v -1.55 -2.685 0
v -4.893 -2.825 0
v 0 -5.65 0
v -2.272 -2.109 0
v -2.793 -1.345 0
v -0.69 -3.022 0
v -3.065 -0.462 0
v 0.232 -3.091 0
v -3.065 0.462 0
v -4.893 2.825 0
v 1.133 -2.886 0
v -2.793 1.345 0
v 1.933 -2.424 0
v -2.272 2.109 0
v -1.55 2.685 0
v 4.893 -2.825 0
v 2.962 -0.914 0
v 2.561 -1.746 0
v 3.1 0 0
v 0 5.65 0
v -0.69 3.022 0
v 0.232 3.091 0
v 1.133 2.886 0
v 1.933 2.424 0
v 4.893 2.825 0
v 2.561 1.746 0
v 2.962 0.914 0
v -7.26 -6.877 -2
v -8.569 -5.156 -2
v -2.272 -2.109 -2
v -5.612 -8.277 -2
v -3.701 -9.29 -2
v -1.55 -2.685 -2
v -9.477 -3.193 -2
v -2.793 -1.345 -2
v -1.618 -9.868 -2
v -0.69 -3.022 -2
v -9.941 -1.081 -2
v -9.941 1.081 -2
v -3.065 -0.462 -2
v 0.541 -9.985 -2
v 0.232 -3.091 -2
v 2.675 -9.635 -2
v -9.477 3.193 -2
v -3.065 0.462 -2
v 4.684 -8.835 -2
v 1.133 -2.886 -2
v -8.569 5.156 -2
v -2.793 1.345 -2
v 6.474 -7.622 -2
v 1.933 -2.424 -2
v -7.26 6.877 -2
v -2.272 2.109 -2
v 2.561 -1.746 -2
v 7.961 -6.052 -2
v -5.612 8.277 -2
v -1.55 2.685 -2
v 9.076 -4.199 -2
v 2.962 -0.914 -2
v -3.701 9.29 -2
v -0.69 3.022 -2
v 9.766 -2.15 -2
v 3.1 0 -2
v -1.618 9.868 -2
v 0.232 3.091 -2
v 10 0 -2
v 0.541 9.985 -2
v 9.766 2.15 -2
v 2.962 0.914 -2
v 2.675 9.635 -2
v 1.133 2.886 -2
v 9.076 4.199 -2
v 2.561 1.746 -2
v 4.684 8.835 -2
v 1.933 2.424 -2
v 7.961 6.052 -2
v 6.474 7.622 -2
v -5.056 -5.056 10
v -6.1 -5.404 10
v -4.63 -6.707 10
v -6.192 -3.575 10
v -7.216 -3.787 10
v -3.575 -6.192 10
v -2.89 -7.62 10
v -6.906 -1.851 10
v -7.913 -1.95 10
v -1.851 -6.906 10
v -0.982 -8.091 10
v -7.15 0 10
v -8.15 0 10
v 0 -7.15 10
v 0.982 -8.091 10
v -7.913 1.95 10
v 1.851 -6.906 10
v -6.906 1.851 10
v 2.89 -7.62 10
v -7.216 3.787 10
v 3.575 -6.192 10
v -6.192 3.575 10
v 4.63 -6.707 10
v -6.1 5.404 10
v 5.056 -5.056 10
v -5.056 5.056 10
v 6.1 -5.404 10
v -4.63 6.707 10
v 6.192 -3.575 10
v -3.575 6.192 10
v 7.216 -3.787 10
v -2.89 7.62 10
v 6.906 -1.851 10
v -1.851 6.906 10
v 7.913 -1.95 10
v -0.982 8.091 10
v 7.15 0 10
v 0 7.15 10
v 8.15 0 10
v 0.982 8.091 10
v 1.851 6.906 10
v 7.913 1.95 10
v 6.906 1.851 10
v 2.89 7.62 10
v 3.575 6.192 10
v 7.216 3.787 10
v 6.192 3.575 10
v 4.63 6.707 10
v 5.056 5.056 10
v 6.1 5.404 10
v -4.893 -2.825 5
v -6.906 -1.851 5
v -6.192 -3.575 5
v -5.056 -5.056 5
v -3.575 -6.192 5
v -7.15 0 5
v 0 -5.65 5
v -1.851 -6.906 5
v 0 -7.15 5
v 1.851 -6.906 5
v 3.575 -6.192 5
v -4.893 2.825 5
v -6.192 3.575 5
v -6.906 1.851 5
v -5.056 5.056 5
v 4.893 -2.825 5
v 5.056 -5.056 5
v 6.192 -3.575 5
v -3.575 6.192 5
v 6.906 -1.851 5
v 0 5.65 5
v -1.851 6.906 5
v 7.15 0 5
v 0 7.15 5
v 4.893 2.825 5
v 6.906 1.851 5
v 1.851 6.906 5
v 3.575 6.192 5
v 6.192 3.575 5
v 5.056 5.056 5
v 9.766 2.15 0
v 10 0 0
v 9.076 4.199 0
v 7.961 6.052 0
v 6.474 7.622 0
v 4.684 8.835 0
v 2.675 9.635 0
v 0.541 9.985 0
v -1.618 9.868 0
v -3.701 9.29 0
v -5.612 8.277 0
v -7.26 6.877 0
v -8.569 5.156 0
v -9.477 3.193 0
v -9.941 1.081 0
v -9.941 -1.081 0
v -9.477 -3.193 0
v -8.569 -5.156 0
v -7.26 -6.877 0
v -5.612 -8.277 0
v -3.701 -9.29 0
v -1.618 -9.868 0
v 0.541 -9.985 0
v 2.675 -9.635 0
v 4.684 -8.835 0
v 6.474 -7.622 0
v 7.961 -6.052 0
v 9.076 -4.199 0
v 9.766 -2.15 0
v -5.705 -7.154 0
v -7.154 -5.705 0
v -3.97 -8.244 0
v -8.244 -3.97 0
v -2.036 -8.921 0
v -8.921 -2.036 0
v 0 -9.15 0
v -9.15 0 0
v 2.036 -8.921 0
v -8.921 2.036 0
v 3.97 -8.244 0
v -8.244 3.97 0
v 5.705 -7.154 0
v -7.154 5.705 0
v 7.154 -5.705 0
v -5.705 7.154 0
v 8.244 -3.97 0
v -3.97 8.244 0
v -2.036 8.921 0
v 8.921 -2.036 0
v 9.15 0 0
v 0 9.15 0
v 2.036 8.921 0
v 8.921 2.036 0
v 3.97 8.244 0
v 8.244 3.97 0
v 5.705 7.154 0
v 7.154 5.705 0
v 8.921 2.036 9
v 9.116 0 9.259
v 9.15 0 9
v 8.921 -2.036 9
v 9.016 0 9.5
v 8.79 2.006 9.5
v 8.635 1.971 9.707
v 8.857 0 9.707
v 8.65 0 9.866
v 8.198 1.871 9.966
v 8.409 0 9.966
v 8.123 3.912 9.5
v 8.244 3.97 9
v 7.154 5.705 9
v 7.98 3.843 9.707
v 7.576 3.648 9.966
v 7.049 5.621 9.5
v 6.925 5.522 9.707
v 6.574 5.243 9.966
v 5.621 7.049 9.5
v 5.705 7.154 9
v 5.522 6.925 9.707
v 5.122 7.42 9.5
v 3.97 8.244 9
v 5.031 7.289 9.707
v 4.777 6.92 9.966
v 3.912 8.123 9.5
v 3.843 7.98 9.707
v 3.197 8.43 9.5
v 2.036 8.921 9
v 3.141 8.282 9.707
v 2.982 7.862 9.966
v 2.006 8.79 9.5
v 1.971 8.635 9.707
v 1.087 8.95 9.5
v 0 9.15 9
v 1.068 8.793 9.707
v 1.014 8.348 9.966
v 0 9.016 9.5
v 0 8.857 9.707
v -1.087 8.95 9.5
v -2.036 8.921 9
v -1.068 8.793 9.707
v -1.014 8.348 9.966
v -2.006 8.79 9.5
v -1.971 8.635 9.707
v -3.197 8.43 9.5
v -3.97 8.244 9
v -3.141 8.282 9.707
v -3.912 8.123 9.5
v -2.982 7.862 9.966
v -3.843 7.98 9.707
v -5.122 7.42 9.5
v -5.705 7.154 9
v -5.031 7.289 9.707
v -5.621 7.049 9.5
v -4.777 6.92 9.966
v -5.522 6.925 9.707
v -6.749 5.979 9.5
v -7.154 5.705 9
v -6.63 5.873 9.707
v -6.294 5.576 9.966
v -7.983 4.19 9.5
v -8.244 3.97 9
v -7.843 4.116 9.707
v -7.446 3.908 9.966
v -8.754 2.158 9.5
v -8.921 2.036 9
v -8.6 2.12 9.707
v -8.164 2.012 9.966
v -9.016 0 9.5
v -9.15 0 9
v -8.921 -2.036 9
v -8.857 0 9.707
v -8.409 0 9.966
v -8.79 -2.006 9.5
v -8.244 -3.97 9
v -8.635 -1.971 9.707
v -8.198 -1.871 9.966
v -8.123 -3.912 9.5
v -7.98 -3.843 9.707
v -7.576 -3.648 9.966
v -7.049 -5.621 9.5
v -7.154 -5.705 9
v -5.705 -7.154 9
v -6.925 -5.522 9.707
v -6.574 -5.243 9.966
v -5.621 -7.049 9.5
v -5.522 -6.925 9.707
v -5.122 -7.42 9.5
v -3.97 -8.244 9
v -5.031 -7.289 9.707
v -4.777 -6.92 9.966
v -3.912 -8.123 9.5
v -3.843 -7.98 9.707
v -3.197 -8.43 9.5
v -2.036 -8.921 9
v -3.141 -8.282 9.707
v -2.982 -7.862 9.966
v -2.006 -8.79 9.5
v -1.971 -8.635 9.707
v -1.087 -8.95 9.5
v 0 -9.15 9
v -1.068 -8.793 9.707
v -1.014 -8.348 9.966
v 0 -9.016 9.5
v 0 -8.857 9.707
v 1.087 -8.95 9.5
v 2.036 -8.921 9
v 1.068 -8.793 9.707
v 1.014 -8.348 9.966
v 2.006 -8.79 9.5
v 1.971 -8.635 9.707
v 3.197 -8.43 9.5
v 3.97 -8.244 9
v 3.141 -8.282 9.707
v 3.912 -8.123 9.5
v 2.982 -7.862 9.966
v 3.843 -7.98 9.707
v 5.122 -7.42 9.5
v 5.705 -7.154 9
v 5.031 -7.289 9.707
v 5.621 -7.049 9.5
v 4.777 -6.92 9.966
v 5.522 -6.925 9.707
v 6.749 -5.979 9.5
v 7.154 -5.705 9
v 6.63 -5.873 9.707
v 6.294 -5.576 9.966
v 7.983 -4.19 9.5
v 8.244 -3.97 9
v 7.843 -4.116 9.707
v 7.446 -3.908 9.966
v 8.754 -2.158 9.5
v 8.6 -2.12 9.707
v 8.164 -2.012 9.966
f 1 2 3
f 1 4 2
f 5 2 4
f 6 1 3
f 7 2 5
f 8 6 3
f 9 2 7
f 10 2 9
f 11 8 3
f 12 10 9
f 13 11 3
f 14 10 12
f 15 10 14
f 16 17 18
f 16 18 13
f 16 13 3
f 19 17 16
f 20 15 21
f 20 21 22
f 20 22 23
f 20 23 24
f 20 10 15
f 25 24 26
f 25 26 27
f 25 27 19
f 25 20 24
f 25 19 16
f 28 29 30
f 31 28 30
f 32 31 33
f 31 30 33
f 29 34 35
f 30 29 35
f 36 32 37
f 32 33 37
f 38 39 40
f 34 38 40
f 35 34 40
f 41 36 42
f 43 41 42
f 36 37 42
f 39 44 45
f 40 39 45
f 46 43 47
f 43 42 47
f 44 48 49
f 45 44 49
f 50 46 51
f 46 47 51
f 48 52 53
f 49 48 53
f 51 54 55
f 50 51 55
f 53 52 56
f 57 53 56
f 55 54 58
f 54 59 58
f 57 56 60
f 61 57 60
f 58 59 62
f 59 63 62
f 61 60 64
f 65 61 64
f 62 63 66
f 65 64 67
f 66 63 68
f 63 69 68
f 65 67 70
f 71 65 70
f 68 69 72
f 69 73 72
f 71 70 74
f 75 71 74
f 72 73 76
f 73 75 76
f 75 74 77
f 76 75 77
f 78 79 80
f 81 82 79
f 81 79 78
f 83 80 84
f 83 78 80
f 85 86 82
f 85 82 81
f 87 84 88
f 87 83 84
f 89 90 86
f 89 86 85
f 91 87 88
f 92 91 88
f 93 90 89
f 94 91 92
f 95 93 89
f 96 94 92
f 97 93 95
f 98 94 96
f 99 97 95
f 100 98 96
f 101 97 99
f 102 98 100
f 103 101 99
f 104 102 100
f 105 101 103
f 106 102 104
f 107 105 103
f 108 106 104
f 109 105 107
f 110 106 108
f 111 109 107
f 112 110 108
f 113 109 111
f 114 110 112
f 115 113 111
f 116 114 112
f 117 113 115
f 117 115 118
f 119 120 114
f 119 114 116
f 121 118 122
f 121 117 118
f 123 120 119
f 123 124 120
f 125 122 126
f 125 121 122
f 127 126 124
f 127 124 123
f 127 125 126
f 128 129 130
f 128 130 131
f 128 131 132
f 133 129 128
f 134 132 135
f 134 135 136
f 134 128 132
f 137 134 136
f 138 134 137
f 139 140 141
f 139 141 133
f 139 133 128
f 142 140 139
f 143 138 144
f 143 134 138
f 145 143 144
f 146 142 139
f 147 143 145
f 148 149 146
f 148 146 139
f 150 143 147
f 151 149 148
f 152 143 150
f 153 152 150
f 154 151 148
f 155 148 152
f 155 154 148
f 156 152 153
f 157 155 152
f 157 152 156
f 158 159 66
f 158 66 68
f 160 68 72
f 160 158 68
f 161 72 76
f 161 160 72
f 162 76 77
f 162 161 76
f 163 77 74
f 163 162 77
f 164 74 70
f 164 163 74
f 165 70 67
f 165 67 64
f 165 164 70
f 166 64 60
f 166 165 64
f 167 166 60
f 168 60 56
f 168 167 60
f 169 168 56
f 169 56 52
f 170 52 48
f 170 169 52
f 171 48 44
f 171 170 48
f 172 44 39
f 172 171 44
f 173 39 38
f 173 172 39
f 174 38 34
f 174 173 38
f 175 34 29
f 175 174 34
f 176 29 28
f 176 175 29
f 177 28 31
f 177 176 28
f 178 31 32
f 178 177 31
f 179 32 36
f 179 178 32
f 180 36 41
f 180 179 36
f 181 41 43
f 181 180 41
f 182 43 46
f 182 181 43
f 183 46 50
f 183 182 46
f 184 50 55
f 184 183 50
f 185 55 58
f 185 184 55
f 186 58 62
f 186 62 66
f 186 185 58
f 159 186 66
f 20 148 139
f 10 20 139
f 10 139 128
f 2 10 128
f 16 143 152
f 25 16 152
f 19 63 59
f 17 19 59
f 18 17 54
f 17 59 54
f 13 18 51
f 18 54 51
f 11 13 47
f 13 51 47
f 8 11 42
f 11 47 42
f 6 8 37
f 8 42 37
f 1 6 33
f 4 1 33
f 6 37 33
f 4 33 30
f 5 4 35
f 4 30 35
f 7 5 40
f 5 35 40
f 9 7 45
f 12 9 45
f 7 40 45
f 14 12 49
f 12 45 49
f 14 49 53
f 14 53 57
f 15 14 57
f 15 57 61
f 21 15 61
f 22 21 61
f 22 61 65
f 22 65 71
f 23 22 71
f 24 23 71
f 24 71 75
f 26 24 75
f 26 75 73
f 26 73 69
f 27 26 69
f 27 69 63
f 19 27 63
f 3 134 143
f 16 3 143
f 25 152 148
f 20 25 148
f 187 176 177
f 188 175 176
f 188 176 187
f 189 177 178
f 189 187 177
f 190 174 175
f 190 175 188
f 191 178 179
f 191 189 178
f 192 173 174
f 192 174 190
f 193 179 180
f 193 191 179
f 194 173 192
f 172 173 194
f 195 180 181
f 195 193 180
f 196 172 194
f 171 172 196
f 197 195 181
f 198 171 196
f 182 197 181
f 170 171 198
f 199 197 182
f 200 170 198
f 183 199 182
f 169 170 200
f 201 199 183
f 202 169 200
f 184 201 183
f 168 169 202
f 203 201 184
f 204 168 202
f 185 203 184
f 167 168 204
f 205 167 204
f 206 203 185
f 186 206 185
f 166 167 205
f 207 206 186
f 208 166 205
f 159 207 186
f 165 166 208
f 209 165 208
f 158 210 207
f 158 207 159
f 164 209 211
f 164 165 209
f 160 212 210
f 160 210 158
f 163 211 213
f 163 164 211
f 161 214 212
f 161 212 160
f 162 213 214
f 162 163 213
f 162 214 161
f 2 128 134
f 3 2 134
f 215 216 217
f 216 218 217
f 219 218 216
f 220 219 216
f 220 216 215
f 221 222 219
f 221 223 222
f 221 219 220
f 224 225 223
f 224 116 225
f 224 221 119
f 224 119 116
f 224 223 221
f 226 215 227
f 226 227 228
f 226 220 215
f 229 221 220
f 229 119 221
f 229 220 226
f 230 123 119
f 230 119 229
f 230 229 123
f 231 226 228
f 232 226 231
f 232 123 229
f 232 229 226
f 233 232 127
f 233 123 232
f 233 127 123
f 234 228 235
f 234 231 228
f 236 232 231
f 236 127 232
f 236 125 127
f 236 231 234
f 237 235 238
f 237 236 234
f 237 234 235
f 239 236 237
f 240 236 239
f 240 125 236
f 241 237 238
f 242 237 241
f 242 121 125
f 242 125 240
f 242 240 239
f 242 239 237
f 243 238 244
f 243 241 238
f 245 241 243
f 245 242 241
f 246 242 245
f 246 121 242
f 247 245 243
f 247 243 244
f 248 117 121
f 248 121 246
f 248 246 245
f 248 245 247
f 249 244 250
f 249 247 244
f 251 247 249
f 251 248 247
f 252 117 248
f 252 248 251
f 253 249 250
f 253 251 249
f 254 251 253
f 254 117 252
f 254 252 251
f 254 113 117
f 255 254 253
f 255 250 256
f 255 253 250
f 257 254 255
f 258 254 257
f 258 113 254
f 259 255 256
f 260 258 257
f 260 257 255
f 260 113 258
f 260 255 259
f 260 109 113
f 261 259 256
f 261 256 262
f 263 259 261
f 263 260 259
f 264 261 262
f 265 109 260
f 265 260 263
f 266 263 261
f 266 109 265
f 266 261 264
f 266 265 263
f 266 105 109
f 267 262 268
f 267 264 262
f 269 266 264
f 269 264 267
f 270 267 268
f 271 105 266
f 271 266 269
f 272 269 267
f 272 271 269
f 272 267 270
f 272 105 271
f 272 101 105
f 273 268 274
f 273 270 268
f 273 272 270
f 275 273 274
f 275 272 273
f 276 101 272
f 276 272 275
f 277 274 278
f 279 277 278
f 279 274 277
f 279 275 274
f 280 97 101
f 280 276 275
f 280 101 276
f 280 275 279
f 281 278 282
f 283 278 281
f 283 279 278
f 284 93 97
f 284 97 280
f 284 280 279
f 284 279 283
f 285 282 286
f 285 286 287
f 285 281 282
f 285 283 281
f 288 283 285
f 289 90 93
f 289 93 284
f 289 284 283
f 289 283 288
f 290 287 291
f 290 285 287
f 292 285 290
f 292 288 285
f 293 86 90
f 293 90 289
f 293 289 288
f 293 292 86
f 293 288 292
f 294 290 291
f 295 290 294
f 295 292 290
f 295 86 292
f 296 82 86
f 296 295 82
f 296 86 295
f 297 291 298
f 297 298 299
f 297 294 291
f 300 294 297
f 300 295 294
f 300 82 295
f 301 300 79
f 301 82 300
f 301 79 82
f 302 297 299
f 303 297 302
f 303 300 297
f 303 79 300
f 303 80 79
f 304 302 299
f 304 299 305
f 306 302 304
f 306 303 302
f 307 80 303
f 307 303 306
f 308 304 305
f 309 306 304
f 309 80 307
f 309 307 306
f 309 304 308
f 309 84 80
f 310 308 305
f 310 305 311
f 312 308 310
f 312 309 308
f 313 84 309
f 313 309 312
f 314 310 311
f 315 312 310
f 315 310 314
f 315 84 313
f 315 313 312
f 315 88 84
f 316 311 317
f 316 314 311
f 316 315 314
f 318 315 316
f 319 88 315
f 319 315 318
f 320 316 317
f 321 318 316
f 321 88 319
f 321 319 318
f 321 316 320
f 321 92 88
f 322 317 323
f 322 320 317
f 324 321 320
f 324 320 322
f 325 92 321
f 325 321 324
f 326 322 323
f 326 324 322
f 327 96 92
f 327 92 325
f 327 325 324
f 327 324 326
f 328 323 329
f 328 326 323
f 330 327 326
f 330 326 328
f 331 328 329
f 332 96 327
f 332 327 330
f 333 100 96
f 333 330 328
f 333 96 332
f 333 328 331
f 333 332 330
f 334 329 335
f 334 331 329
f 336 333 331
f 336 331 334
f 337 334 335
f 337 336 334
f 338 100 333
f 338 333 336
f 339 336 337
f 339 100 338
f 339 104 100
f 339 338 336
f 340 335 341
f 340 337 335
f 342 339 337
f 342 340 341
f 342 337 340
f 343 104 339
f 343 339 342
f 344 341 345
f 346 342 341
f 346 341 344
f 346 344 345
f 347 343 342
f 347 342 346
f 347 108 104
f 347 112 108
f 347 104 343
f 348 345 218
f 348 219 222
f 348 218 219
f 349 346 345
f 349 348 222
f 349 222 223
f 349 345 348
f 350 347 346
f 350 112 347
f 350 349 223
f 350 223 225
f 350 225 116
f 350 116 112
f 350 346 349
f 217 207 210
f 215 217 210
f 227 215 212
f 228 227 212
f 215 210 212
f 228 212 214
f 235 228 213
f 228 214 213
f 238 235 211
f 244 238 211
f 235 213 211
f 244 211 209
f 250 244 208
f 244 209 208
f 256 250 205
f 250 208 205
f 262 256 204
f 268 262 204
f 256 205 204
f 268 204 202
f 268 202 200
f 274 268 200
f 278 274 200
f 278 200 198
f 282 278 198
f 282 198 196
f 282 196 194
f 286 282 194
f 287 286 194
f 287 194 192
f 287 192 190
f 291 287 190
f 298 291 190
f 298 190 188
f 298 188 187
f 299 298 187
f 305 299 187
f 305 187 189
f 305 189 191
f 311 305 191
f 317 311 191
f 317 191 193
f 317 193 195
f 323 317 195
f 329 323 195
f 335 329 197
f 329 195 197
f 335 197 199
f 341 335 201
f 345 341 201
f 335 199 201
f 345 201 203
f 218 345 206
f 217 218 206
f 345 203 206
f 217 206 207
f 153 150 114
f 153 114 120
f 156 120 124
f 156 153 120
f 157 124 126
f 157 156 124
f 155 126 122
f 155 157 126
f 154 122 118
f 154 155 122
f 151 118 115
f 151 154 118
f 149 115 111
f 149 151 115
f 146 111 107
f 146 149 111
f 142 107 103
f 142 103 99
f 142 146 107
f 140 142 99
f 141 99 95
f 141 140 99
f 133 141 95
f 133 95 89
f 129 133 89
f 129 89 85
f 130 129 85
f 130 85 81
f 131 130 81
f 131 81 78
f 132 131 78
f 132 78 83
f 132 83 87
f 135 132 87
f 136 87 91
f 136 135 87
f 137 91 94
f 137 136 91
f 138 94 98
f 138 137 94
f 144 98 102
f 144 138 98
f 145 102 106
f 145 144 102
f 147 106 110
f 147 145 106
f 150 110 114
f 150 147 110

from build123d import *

# Parameters (mm, degrees)
F0_R     = 10
F1_DEPTH = 2
F2_R     = 9.15
F3_DEPTH = 5
F5_DEPTH = 5
F6_R     = 9.15
F6_R_2   = 7.15
F7_DEPTH = 5
F8_R     = 3.1
F9_DEPTH = 12.001
F10_R    = 1


with BuildPart() as f1:
    # F0 (on Top) → F1 (new body)
    with BuildSketch(Plane.XY):
        Circle(F0_R)
    extrude(amount=-F1_DEPTH)

    # F2 (on face) → F3 (join)
    with BuildSketch(Plane.XY):
        Circle(F2_R)
    extrude(amount=F3_DEPTH)

    # F4 (on face) → F5 (cut)
    with BuildSketch(Plane.XY.offset(5)):
        Polygon((4.893044, 2.825), (0, 5.65), (-4.893044, 2.825), (-4.893044, -2.825), (0, -5.65), (4.893044, -2.825), align=None)
    extrude(amount=-F5_DEPTH, mode=Mode.SUBTRACT)

    # F6 (on face) → F7 (join)
    with BuildSketch(Plane.XY.offset(5)):
        Circle(F6_R)
        Circle(F6_R_2, mode=Mode.SUBTRACT)
    extrude(amount=F7_DEPTH)

    # F8 (on face) → F9 (cut, through all)
    with BuildSketch(Plane(origin=(0, 0, -2), x_dir=(1, 0, 0), z_dir=(0, 0, -1))):
        Circle(F8_R)
    extrude(amount=-F9_DEPTH, mode=Mode.SUBTRACT)

    # F10
    f10_edges = [f1.edges().sort_by_distance(p)[0] for p in [
        (-9.15, 0, 10),
    ]]
    fillet(f10_edges, radius=F10_R)


solid = f1.part
